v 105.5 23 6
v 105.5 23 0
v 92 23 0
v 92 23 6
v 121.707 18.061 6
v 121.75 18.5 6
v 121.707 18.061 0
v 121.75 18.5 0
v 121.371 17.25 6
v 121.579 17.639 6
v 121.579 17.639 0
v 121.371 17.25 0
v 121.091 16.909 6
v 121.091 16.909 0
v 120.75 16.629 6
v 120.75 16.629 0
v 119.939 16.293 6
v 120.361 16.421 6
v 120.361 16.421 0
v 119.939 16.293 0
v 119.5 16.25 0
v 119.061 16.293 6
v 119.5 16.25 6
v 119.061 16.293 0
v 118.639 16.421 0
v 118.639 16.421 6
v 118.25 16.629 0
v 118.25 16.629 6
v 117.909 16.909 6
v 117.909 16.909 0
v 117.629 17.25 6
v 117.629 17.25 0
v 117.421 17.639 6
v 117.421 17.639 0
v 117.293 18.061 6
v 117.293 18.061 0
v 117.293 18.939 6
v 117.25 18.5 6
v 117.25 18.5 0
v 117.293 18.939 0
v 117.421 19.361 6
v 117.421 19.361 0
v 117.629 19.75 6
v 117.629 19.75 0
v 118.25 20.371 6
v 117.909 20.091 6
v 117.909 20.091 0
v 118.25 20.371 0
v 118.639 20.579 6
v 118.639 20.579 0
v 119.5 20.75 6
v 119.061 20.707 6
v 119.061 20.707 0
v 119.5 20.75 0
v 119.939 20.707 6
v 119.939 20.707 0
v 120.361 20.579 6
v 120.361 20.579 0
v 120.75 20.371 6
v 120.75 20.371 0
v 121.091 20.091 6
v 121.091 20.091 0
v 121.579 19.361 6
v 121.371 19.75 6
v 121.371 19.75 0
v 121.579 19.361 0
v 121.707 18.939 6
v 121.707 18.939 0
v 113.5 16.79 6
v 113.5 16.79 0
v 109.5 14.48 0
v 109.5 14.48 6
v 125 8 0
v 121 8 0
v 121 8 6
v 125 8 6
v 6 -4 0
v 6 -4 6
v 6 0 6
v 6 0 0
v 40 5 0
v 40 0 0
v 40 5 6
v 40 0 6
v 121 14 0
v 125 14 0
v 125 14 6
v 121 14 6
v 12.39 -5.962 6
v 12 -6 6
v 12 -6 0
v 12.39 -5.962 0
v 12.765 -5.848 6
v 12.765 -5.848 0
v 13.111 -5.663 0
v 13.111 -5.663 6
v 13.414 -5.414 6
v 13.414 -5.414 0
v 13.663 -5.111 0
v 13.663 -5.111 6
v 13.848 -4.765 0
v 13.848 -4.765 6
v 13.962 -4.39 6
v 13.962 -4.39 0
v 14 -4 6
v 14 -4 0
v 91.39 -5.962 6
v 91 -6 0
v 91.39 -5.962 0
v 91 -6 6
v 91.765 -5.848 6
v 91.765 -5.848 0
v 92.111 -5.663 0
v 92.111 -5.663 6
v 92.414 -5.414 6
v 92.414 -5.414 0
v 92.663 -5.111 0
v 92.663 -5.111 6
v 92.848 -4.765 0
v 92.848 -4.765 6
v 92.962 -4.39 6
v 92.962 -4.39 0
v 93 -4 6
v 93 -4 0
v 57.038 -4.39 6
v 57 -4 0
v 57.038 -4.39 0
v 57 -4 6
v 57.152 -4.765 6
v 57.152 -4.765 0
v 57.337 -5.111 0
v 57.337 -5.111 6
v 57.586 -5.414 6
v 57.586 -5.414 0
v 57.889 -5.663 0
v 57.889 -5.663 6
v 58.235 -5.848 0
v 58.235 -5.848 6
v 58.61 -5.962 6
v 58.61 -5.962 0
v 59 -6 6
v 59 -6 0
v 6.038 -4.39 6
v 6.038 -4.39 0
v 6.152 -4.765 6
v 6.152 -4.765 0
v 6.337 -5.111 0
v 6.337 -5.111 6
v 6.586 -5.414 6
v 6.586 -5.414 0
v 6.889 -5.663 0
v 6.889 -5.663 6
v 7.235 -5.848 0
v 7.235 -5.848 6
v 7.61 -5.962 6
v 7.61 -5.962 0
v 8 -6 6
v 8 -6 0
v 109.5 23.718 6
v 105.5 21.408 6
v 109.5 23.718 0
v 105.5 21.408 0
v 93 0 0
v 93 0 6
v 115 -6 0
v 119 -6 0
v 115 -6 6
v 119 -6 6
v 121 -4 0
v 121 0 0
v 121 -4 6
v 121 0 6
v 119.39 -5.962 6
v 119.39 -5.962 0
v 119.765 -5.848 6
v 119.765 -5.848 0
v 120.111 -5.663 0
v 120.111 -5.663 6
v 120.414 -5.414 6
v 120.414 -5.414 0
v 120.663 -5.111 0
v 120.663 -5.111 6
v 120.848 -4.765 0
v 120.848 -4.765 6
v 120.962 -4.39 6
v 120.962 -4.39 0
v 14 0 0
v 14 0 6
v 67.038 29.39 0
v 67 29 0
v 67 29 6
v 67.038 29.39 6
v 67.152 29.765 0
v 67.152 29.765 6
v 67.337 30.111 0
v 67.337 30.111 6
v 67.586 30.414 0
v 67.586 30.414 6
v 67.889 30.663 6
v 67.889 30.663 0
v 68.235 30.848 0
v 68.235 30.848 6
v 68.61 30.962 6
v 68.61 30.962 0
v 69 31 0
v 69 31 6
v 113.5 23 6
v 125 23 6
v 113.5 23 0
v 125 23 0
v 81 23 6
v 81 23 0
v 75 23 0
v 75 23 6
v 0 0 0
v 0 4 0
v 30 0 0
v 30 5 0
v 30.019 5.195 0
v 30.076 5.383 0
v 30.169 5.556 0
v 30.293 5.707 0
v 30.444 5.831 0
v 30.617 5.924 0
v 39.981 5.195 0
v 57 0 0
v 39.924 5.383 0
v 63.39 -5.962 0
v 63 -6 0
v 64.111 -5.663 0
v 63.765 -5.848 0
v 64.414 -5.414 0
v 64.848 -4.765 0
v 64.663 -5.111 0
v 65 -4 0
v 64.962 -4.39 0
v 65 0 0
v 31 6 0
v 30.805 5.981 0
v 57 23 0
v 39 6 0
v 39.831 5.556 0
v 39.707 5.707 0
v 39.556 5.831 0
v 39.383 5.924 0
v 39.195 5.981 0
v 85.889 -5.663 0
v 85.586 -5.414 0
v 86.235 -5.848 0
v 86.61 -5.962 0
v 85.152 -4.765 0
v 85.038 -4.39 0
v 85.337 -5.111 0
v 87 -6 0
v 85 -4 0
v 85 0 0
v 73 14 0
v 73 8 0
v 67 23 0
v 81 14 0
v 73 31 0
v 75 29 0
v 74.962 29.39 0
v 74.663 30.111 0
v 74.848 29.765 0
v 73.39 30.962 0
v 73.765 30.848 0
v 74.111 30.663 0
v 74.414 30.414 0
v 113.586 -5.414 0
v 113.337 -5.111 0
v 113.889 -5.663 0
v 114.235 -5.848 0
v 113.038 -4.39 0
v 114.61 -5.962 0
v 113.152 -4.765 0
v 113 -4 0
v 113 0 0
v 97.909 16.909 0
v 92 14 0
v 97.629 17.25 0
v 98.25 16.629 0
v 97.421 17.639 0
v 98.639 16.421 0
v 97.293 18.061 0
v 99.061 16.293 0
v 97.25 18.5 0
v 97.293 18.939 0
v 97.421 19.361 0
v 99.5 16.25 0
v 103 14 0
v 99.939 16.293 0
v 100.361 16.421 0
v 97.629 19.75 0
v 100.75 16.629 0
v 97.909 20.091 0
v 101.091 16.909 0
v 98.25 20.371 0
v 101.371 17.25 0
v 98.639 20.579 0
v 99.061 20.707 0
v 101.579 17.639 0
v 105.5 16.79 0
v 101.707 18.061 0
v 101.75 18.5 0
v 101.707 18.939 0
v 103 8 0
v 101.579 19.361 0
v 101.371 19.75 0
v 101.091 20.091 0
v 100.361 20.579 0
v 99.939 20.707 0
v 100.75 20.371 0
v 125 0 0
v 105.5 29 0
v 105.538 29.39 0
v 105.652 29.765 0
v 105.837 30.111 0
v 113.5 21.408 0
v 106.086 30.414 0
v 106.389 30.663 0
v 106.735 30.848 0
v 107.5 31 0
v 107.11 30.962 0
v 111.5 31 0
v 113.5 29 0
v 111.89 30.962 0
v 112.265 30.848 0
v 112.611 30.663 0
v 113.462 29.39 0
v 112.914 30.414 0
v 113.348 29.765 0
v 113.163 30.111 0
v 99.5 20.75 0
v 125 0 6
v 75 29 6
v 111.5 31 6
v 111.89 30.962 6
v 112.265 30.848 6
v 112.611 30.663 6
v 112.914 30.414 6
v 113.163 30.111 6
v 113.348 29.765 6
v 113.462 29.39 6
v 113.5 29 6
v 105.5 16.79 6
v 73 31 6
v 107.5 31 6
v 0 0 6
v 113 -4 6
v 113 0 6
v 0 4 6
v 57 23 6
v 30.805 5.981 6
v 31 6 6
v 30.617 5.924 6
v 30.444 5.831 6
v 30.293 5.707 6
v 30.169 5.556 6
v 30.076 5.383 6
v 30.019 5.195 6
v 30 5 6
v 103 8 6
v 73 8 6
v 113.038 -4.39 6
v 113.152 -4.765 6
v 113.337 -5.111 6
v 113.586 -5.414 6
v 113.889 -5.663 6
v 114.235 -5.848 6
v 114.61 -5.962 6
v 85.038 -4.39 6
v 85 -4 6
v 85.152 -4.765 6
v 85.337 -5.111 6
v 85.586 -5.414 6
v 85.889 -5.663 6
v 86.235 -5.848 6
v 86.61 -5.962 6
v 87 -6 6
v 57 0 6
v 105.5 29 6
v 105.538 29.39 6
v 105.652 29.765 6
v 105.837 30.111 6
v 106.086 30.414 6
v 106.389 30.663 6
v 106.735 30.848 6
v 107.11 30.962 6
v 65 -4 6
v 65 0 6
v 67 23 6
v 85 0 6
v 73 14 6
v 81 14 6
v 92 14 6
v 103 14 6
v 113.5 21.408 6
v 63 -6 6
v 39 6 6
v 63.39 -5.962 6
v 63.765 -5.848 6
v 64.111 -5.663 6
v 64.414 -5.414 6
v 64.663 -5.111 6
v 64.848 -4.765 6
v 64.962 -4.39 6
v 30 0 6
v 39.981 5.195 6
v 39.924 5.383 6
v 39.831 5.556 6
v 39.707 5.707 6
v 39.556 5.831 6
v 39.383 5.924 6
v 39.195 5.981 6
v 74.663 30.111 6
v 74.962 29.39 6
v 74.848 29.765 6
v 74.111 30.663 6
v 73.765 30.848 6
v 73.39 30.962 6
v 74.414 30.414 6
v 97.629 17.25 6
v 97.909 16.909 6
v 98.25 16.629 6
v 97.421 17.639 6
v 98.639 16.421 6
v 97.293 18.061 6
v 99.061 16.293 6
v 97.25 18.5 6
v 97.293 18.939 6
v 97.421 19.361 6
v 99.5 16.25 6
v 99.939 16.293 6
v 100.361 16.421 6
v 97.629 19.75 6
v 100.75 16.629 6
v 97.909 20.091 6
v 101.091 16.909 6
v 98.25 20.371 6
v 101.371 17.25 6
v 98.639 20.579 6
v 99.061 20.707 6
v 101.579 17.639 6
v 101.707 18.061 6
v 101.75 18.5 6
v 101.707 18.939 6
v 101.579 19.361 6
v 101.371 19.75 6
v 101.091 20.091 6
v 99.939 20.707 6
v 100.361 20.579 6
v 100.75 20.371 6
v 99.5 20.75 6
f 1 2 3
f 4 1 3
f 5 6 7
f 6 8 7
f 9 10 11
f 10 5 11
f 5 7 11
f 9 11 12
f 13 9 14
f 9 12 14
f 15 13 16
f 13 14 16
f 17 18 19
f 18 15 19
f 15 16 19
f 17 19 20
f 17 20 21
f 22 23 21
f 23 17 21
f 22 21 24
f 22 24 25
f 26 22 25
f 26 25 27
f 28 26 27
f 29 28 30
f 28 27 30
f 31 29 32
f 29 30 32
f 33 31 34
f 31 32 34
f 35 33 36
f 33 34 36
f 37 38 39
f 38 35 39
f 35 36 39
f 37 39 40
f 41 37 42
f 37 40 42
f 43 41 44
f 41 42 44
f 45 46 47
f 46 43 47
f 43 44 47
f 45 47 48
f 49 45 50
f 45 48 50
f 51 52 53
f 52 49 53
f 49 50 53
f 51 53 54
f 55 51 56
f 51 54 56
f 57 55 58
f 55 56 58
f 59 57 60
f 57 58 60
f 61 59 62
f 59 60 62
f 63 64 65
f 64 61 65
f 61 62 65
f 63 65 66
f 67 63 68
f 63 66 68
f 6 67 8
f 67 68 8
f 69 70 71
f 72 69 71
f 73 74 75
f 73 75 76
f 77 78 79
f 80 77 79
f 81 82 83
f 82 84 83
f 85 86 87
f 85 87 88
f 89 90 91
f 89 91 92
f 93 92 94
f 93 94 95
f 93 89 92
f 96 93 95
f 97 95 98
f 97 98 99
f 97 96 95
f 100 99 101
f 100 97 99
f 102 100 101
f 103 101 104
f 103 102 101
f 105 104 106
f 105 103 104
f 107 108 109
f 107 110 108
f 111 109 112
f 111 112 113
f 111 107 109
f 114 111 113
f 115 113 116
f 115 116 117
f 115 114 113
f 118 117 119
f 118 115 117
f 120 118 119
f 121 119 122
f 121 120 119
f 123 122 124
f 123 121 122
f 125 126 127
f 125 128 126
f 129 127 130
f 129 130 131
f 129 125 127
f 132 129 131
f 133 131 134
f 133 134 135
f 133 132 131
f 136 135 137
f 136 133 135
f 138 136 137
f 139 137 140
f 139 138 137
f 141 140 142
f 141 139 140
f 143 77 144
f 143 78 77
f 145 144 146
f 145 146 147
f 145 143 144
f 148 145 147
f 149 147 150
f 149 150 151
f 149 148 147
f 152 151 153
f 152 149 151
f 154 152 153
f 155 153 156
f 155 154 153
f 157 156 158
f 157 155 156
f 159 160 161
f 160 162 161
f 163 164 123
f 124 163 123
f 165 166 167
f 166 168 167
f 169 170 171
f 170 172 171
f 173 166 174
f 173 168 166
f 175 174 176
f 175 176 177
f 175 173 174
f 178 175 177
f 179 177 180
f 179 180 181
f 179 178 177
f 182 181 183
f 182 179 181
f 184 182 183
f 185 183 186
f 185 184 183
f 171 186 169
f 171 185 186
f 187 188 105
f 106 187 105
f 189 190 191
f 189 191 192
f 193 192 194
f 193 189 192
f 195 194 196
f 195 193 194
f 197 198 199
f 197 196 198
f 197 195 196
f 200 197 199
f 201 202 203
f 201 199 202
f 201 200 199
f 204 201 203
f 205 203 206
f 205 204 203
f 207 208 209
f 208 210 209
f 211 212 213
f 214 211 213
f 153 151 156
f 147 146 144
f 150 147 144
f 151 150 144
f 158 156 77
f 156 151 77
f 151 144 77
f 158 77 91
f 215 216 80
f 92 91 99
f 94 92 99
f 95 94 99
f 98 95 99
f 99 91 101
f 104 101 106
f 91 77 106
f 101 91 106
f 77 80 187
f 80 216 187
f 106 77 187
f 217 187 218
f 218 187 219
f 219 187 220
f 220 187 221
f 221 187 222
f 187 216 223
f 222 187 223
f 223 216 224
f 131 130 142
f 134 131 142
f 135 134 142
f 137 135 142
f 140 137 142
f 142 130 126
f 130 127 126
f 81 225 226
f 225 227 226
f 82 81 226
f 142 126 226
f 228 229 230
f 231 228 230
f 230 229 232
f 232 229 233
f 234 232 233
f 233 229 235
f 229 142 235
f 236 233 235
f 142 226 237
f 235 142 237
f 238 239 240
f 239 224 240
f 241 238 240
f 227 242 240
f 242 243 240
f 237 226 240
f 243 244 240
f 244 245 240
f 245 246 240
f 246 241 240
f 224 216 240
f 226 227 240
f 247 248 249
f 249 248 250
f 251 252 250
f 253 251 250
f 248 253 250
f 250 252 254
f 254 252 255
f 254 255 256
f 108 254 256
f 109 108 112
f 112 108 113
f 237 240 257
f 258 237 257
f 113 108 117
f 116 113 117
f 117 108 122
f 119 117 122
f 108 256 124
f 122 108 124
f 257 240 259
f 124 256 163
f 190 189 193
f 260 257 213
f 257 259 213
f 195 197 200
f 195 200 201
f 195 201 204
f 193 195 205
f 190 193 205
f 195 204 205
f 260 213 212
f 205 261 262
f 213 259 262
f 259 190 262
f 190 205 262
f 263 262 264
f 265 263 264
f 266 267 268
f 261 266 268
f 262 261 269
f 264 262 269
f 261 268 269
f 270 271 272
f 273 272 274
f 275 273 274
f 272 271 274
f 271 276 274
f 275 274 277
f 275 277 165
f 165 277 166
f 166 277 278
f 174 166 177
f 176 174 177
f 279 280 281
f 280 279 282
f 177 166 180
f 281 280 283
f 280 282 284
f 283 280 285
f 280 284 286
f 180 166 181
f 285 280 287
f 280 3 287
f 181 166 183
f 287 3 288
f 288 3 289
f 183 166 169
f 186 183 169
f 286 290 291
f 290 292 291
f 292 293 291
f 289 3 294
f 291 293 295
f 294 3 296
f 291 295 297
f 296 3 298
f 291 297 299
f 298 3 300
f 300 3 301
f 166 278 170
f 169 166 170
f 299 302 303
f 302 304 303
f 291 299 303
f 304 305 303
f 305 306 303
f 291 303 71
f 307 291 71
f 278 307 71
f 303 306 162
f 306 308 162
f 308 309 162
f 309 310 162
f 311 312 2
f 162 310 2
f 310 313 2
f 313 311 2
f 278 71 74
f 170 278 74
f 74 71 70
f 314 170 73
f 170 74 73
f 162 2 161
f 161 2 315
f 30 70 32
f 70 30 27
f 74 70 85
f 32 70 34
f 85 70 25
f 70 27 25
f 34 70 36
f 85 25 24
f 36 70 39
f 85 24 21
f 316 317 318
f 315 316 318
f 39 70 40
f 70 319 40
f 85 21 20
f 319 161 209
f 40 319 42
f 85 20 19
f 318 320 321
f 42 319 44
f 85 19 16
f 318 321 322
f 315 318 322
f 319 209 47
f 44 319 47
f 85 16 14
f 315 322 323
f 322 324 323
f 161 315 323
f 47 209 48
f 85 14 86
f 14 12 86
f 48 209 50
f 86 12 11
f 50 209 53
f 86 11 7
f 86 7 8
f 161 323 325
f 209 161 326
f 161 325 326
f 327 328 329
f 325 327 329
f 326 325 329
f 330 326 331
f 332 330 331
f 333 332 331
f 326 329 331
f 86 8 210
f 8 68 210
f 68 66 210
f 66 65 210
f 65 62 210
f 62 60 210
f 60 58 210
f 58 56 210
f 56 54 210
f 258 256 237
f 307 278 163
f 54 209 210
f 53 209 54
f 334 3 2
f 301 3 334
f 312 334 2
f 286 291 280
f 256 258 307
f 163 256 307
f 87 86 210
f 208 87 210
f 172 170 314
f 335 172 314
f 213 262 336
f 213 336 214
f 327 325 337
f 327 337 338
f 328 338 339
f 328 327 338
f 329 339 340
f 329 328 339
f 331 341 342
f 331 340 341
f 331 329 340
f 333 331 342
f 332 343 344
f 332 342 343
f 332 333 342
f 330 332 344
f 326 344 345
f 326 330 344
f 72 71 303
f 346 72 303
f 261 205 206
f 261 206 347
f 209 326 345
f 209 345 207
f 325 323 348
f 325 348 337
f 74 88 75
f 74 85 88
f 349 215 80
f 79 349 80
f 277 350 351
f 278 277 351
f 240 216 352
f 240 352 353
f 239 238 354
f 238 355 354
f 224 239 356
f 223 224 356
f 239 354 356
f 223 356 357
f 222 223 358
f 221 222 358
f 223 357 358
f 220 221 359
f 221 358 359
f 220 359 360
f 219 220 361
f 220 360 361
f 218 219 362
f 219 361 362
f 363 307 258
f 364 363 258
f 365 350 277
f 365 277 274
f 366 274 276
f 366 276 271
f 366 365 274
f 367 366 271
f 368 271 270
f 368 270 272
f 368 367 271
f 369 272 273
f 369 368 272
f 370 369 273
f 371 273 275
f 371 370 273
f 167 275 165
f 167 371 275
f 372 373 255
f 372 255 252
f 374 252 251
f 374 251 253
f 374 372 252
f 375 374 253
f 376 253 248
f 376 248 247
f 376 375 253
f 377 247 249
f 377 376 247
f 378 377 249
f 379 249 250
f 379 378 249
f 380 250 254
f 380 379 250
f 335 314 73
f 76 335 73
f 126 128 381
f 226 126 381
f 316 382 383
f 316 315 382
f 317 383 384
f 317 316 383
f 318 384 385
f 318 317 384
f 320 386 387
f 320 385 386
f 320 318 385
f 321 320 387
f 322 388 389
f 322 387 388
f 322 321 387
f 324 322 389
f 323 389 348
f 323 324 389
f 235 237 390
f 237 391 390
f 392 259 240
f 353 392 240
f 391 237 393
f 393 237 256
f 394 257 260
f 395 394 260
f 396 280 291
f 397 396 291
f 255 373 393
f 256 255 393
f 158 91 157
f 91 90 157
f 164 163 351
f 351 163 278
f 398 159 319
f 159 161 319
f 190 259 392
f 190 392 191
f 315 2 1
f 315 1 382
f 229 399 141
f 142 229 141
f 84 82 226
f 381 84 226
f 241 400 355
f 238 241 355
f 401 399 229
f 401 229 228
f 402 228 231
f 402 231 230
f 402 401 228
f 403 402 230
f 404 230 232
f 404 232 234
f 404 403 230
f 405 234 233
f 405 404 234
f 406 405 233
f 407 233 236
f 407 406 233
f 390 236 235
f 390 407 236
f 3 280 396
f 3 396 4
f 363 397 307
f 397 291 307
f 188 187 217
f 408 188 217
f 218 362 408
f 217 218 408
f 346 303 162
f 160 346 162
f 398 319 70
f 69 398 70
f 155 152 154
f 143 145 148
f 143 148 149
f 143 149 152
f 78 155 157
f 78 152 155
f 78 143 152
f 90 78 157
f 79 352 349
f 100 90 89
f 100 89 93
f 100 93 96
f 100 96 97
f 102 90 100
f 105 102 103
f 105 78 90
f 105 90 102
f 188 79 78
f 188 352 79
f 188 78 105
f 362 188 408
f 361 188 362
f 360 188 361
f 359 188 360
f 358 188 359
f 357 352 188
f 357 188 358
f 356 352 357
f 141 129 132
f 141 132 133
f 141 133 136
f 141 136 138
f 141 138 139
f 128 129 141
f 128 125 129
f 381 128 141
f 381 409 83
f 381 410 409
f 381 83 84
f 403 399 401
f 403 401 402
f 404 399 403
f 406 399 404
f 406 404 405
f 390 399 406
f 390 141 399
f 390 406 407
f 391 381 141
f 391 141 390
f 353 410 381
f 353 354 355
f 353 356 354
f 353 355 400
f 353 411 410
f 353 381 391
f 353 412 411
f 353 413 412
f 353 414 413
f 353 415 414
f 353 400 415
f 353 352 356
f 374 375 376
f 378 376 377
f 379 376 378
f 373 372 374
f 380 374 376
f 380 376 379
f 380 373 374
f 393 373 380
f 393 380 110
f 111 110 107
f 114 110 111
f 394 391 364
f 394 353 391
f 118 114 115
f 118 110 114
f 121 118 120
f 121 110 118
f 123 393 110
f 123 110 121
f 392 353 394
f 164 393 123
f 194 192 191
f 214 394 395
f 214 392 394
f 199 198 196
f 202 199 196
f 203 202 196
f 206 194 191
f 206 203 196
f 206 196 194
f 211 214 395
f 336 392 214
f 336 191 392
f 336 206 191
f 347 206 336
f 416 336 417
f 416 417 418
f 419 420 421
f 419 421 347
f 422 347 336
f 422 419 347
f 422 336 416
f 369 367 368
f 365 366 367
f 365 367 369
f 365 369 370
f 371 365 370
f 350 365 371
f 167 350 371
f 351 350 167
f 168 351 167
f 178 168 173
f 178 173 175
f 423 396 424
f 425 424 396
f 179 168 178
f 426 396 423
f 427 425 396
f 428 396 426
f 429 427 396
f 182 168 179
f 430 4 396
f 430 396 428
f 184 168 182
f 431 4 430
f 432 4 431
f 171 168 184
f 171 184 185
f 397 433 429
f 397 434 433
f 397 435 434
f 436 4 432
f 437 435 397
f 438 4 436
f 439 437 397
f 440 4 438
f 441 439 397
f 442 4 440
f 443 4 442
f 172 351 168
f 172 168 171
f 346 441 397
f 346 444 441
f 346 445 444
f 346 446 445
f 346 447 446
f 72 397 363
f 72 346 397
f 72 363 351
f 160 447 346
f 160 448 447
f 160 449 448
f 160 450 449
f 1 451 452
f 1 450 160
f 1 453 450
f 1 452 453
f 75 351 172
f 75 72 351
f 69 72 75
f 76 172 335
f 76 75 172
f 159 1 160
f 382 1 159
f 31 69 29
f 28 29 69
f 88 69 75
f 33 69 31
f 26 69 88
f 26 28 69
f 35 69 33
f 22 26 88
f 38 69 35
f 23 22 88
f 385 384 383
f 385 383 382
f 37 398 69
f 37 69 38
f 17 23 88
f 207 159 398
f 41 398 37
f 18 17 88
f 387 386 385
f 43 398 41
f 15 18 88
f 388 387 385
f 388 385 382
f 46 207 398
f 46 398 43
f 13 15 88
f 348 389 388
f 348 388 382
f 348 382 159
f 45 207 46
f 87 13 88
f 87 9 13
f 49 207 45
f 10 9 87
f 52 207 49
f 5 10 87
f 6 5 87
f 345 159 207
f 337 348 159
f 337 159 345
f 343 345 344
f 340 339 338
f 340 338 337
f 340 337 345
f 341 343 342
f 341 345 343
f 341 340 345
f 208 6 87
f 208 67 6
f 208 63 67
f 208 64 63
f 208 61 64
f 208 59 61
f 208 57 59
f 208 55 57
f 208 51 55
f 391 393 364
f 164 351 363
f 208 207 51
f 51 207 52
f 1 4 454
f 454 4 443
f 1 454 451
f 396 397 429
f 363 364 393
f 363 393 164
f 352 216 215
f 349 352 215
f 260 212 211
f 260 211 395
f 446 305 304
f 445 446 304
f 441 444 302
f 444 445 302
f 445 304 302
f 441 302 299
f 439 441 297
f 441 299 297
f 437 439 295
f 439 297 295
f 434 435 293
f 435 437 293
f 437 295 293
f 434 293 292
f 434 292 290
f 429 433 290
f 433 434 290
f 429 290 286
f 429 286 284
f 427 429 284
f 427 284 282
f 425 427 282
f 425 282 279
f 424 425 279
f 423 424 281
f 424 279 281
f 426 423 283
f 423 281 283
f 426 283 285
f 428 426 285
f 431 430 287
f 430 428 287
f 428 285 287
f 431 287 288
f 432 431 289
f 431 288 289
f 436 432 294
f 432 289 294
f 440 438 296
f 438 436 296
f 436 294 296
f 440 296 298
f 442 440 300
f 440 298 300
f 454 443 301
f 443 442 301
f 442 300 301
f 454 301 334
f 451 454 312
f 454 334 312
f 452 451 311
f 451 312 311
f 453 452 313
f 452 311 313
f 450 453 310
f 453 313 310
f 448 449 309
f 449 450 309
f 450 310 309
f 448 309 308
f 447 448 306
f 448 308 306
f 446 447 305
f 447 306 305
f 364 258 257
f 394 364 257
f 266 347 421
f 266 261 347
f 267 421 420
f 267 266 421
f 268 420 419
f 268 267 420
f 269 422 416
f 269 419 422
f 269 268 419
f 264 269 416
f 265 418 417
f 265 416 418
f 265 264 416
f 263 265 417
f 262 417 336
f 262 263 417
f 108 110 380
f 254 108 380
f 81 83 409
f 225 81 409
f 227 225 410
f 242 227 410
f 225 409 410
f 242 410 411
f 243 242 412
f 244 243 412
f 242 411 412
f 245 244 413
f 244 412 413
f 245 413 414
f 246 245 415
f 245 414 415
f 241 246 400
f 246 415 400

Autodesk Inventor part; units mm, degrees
ref_plane "YZ Plane" through (0, 0, 0) normal (1, 0, 0) x (0, 1, 0)
ref_plane "XZ Plane" through (0, 0, 0) normal (0, 1, 0) x (-1, 0, 0)
ref_plane "XY Plane" through (0, 0, 0) normal (0, 0, 1) x (1, 0, 0)
sketch "Sketch1" plane through (0, 0, 0) normal (0, 0, 1) x (1, 0, 0)
  line L0 (0, 4) -> (0, 0)
  line L1 (0, 0) -> (125, 0)
  line L2 (0, 4) -> (57, 23)
  line L3 (103, 14) -> (103, 8)
  line L4 (103, 8) -> (73, 8)
  line L5 (73, 8) -> (73, 14)
  line L6 (125, 14) -> (121, 14)
  line L7 (121, 14) -> (121, 8)
  line L8 (121, 8) -> (125, 8)
  line L9 (125, 0) -> (125, 8)
  line L10 (125, 14) -> (125, 23)
  line L11 (81, 23) -> (81, 14)
  line L12 (92, 14) -> (92, 23)
  line L13 (73, 14) -> (81, 14)
  line L14 (92, 14) -> (103, 14)
  line L15 (81, 14) -> (92, 14) construction
  circle A0 centre (86.5, 19.099) radius 7.5 construction
  circle A1 centre (86.5, 19.099) radius 4 construction
  line L16 (113.5, 21.4084) -> (113.5, 16.7896)
  line L17 (113.5, 16.7896) -> (109.5, 14.4802)
  line L18 (109.5, 14.4802) -> (105.5, 16.7896)
  line L19 (105.5, 16.7896) -> (105.5, 21.4084)
  line L20 (105.5, 21.4084) -> (109.5, 23.7178)
  line L21 (109.5, 23.7178) -> (113.5, 21.4084)
  circle A2 centre (109.5, 19.099) radius 2.5 construction
  line L22 (105.5, 23) -> (105.5, 29)
  line L23 (107.5, 31) -> (111.5, 31)
  line L24 (113.5, 29) -> (113.5, 23)
  arc A3 (107.5, 31) -> (105.5, 29) centre (107.5, 29) ccw
  arc A4 (113.5, 29) -> (111.5, 31) centre (111.5, 29) ccw
  line L25 (125, 23) -> (113.5, 23)
  line L26 (105.5, 23) -> (92, 23)
  circle A5 centre (99.5, 18.5) radius 4.5 construction
  circle A6 centre (119.5, 18.5) radius 4.5 construction
  circle A7 centre (99.5, 18.5) radius 2.25
  circle A8 centre (119.5, 18.5) radius 2.25
  line L27 (67, 23) -> (67, 29)
  line L28 (69, 31) -> (73, 31)
  line L29 (75, 29) -> (75, 23)
  arc A9 (69, 31) -> (67, 29) centre (69, 29) ccw
  arc A10 (75, 29) -> (73, 31) centre (73, 29) ccw
  line L30 (81, 23) -> (75, 23)
  line L31 (67, 23) -> (57, 23)
  point P0 (81, 14)
  point P1 (92, 14)
  point P2 (86.5, 14)
  point P3 (125, 18.5)
  point P4 (109.5, 31)
  dimension "d0" = 8
  dimension "d2" = 6
  dimension "d3" = 4
  dimension "d4" = 15
  dimension "d5" = 8
  dimension "d6" = 9
  dimension "d7" = 11
  dimension "d8" = 11
  dimension "d9" = 8
  dimension "d10" = 5
  dimension "d11" = 2
  dimension "d12" = 8
  dimension "d13" = 9
  dimension "d14" = 9
  dimension "d15" = 10
  dimension "d16" = 10
  dimension "d17" = 4.5
  dimension "d18" = 4.5
  dimension "d19" = 13
  dimension "d20" = 5.5
  dimension "d21" = 18
  dimension "d22" = 2
  dimension "d23" = 8
  dimension "d24" = 6
  dimension "d25" = 10
  dimension "d27" = 30
  dimension "d28" = 4
  dimension "d30" = 8
  dimension "d31" = 125
extrude "Extrusion1" add sketch "Sketch1" along normal blind 6
sketch "Sketch2" plane through (0, 0, 6) normal (0, 0, 1) x (1, 0, 0)
  line L0 (0, 4) -> (0, 0) projected
  line L1 (0, 0) -> (125, 0) projected
  line L2 (6, 0) -> (14, 0)
  line L3 (14, 0) -> (14, -4)
  line L4 (12, -6) -> (8, -6)
  line L5 (6, -4) -> (6, 0)
  line L6 (57, 0) -> (65, 0)
  line L7 (65, 0) -> (65, -4)
  line L8 (63, -6) -> (59, -6)
  line L9 (57, -4) -> (57, 0)
  line L10 (85, 0) -> (93, 0)
  line L11 (93, 0) -> (93, -4)
  line L12 (91, -6) -> (87, -6)
  line L13 (85, -4) -> (85, 0)
  line L14 (113, 0) -> (121, 0)
  line L15 (121, 0) -> (121, -4)
  line L16 (119, -6) -> (115, -6)
  line L17 (113, -4) -> (113, 0)
  arc A0 (6, -4) -> (8, -6) centre (8, -4) ccw
  arc A1 (12, -6) -> (14, -4) centre (12, -4) ccw
  arc A2 (57, -4) -> (59, -6) centre (59, -4) ccw
  arc A3 (63, -6) -> (65, -4) centre (63, -4) ccw
  arc A4 (85, -4) -> (87, -6) centre (87, -4) ccw
  arc A5 (91, -6) -> (93, -4) centre (91, -4) ccw
  arc A6 (113, -4) -> (115, -6) centre (115, -4) ccw
  arc A7 (119, -6) -> (121, -4) centre (119, -4) ccw
  dimension "d34" = 2
  dimension "d35" = 8
  dimension "d36" = 8
  dimension "d37" = 8
  dimension "d38" = 8
  dimension "d39" = 6
  dimension "d40" = 6
  dimension "d41" = 43
  dimension "d42" = 20
  dimension "d43" = 20
extrude "Extrusion2" add sketch "Sketch2" against normal blind 6
sketch "Sketch3" plane through (0, 0, 6) normal (0, 0, 1) x (1, 0, 0)
  line L0 (0, 4) -> (0, 0) projected
  line L1 (14, 0) -> (57, 0) projected
  line L2 (30, 0) -> (40, 0)
  line L3 (40, 0) -> (40, 5)
  line L4 (39, 6) -> (31, 6)
  line L5 (30, 5) -> (30, 0)
  arc A0 (31, 6) -> (30, 5) centre (31, 5) ccw
  arc A1 (40, 5) -> (39, 6) centre (39, 5) ccw
  point P0 (35, 6)
  dimension "d46" = 1
  dimension "d47" = 10
  dimension "d48" = 6
  dimension "d49" = 35
extrude "Extrusion3" cut sketch "Sketch3" against normal through all
properties part number "x_motor_wall_lower"
